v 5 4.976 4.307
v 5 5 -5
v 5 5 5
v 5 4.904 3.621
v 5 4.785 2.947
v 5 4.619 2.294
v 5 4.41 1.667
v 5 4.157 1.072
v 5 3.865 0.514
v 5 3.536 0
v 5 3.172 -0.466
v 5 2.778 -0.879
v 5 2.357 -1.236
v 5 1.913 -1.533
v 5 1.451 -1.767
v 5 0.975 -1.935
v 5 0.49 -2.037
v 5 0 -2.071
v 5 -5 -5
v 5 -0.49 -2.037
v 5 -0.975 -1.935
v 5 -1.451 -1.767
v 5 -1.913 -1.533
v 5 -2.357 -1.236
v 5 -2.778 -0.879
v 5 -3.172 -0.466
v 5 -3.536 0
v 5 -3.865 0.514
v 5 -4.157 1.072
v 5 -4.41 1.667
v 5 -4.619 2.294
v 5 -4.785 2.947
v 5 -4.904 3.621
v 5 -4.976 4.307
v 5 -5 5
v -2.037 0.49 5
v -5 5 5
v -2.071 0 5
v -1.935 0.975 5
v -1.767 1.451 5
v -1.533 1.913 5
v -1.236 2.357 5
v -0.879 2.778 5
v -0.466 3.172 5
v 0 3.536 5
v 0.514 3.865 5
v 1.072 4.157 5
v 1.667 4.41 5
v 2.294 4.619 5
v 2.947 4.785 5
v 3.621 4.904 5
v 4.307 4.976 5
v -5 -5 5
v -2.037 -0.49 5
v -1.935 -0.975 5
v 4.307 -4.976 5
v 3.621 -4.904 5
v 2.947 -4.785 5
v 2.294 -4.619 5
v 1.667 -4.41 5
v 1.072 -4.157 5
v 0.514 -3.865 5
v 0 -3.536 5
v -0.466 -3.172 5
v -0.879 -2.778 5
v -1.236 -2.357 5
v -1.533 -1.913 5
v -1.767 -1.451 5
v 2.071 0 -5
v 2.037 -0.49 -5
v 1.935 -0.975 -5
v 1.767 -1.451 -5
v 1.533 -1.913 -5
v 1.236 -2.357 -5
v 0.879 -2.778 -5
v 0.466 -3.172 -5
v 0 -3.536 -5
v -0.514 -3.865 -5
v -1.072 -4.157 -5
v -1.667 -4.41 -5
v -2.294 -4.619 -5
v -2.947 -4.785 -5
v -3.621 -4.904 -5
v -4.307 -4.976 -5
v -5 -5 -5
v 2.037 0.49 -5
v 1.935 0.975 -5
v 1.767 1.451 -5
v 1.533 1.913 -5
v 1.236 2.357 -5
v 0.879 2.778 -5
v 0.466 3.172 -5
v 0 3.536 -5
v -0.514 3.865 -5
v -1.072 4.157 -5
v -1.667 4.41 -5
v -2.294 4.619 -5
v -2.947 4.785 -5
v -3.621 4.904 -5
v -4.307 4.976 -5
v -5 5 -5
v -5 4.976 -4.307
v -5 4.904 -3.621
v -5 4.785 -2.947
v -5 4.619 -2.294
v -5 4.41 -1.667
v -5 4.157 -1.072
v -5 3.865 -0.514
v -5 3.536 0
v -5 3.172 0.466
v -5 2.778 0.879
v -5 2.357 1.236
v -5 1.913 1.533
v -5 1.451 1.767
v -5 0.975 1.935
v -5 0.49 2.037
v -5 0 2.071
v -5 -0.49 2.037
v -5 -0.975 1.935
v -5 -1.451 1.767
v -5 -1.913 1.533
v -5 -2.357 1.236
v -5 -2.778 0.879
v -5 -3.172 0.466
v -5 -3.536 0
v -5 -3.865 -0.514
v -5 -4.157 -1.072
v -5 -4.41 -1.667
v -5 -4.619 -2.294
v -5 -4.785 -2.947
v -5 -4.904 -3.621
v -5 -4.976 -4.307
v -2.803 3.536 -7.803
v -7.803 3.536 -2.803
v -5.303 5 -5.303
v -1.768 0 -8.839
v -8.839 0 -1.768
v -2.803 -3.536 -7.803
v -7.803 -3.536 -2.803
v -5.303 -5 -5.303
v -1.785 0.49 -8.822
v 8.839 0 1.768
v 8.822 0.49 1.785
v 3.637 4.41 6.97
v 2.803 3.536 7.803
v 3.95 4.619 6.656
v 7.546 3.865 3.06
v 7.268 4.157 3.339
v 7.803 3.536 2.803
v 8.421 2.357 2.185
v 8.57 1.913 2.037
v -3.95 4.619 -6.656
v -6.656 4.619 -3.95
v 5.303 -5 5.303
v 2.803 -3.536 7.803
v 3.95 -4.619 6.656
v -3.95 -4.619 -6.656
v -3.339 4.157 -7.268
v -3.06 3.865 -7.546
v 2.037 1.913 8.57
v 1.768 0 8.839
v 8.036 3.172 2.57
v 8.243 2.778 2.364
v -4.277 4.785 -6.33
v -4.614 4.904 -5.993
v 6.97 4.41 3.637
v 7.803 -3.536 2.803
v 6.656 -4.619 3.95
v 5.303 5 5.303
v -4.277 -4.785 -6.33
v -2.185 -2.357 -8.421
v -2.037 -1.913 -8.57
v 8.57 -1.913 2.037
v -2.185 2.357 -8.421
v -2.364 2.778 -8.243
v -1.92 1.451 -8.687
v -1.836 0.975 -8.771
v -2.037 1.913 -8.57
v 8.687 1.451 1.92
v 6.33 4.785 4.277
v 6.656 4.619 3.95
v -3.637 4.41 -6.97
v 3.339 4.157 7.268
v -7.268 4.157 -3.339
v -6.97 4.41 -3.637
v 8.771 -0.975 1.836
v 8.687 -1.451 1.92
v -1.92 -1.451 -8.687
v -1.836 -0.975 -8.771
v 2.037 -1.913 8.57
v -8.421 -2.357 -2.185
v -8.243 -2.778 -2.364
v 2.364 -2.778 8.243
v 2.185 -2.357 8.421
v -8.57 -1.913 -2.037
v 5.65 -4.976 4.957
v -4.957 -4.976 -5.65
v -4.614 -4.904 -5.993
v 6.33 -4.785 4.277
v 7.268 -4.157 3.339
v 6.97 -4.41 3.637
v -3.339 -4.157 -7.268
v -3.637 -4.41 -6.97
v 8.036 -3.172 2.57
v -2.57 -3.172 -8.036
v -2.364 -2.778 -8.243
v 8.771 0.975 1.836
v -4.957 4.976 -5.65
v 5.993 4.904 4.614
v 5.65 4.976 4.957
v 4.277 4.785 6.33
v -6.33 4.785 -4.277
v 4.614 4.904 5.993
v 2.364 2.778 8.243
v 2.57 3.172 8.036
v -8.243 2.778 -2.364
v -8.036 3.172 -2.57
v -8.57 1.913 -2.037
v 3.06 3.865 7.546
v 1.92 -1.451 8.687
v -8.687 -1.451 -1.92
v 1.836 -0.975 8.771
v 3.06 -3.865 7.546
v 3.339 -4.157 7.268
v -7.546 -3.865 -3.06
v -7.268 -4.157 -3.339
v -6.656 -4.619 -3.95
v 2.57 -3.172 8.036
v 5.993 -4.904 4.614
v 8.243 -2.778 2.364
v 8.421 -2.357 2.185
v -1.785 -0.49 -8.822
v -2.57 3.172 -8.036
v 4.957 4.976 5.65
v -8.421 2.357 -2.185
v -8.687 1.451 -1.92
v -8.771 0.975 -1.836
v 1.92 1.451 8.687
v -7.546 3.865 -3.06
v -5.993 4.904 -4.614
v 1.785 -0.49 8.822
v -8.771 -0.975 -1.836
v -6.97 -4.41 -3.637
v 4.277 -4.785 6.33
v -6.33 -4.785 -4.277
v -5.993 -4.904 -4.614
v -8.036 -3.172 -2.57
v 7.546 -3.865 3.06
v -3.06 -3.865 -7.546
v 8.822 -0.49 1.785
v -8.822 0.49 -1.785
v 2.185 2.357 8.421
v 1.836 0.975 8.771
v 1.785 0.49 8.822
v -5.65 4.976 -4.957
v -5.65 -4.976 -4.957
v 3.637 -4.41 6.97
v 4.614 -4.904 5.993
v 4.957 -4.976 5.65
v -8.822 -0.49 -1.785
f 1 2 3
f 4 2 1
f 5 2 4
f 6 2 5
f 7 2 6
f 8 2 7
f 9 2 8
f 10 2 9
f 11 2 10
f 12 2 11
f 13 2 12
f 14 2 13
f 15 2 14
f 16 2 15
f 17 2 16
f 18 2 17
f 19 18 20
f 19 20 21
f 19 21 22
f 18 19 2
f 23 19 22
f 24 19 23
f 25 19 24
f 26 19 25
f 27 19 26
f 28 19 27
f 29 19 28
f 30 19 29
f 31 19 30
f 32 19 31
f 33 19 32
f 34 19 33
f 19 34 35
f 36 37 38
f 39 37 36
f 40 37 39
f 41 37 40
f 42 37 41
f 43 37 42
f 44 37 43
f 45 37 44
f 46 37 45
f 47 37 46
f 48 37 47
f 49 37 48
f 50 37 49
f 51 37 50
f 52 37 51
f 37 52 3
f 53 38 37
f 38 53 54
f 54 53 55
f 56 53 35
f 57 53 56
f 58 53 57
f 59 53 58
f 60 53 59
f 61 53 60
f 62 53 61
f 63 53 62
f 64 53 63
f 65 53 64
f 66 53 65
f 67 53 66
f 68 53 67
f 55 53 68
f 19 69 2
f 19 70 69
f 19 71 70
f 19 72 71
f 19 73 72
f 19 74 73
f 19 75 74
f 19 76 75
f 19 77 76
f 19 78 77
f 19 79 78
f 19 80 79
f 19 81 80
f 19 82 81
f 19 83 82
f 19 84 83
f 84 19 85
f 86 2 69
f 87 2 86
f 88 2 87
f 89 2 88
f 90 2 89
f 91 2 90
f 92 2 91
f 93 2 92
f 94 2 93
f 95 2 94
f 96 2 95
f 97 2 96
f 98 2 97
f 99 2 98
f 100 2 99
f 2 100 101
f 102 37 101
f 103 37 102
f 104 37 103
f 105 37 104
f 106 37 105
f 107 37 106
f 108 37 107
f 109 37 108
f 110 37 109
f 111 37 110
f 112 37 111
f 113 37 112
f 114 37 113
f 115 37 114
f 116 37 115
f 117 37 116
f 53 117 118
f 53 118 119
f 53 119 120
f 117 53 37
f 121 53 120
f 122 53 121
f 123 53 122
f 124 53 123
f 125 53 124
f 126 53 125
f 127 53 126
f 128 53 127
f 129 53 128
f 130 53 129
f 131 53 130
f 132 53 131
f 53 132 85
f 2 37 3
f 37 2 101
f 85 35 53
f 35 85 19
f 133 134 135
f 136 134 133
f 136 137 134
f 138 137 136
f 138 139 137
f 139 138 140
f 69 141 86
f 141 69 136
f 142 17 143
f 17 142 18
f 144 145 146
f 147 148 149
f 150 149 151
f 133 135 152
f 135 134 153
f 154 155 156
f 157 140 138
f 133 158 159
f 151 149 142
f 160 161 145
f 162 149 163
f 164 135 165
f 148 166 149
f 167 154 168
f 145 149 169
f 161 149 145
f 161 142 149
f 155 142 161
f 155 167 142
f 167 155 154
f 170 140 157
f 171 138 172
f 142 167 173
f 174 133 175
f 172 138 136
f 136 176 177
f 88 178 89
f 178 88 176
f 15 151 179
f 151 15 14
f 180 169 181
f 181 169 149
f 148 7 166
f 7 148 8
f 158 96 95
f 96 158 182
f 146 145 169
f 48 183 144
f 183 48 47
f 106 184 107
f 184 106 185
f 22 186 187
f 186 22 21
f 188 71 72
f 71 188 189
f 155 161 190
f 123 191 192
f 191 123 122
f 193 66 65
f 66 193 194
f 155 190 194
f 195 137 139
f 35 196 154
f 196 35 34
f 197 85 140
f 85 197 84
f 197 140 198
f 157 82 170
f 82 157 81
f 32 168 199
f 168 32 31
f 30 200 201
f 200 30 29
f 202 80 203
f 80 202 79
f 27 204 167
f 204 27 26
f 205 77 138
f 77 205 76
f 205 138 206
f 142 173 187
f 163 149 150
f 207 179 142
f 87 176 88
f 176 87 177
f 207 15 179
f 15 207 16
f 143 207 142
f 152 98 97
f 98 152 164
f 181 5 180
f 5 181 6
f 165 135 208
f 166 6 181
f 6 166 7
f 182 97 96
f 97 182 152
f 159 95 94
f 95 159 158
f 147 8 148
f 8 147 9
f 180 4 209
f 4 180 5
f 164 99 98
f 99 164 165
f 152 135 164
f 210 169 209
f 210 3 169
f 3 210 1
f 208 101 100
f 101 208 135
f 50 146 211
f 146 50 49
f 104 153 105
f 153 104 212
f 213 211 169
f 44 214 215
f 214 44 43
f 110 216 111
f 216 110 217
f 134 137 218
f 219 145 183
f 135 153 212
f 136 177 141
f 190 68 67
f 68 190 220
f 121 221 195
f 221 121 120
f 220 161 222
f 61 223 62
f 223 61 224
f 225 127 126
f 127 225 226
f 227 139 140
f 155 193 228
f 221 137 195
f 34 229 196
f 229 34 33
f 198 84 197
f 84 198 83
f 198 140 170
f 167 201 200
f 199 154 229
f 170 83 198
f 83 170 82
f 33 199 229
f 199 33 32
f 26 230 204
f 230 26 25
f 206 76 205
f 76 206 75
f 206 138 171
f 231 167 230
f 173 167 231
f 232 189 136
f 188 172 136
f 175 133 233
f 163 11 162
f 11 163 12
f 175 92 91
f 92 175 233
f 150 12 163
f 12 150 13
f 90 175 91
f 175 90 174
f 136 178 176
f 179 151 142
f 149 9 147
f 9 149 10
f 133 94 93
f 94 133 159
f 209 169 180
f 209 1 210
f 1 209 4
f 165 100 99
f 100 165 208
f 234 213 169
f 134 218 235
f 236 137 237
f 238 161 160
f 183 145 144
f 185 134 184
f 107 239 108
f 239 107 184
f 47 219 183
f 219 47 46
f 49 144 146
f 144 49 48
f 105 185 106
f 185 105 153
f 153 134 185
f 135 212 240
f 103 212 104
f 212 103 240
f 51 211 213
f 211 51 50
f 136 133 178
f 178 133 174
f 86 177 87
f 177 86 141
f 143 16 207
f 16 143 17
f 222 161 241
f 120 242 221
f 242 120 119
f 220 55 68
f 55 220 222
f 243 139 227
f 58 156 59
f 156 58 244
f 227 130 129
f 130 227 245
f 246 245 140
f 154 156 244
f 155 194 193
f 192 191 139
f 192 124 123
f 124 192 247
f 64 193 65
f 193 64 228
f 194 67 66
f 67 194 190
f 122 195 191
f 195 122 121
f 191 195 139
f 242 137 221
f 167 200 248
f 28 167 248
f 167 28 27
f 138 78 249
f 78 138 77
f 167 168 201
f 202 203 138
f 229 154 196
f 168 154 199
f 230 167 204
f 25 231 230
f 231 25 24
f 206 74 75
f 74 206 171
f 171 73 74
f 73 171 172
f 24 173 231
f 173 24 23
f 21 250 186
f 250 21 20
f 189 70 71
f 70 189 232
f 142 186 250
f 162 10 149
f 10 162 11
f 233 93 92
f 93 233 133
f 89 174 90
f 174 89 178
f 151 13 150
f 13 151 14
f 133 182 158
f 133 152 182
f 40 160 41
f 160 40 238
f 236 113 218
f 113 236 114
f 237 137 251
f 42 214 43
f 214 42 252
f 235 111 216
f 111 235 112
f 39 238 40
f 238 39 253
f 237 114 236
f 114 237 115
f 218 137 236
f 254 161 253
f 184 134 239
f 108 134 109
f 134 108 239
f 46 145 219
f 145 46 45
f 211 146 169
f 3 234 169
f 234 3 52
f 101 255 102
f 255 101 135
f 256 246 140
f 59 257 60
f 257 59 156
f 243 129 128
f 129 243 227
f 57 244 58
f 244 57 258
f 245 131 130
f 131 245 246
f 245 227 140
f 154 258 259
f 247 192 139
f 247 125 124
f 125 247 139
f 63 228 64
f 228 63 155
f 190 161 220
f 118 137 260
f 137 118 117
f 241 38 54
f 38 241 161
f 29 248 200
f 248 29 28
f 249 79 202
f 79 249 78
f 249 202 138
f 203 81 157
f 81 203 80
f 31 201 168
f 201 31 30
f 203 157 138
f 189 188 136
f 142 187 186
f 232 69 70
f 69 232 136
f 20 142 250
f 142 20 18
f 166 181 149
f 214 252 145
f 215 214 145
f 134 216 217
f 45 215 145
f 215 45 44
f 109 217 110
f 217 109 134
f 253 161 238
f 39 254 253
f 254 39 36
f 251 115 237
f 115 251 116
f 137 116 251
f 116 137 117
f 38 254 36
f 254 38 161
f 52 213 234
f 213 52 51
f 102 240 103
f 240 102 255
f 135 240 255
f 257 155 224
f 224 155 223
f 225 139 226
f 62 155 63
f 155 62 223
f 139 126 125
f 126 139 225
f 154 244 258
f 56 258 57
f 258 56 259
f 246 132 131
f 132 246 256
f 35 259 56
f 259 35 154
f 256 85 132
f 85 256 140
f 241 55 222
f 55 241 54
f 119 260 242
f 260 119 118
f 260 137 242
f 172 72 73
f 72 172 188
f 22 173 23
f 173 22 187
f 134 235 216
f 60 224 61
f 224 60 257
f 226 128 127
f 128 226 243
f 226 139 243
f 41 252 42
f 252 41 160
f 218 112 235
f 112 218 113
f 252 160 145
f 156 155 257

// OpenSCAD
// Set fragment number for roundings
$fn = $preview ? 32 : 64;

// Size of the Cube (all directions)
cuSize = 10;

// The diameter of the Cylinder
cyDia = 10;

// The height of the Cylinder
cyHei = 15;

// Y-Rotation of the Cylinder
rY = 45;

// Create Cube and rotate Cylinder by 'rY'
// You can put {} around the shape to rotate
// It's optional if you rotate only one shape
cube(size = [cuSize, cuSize, cuSize], center = true);
rotate([0, rY, 0]){
    cylinder(d = cyDia, h = cyHei, center = true);
}
